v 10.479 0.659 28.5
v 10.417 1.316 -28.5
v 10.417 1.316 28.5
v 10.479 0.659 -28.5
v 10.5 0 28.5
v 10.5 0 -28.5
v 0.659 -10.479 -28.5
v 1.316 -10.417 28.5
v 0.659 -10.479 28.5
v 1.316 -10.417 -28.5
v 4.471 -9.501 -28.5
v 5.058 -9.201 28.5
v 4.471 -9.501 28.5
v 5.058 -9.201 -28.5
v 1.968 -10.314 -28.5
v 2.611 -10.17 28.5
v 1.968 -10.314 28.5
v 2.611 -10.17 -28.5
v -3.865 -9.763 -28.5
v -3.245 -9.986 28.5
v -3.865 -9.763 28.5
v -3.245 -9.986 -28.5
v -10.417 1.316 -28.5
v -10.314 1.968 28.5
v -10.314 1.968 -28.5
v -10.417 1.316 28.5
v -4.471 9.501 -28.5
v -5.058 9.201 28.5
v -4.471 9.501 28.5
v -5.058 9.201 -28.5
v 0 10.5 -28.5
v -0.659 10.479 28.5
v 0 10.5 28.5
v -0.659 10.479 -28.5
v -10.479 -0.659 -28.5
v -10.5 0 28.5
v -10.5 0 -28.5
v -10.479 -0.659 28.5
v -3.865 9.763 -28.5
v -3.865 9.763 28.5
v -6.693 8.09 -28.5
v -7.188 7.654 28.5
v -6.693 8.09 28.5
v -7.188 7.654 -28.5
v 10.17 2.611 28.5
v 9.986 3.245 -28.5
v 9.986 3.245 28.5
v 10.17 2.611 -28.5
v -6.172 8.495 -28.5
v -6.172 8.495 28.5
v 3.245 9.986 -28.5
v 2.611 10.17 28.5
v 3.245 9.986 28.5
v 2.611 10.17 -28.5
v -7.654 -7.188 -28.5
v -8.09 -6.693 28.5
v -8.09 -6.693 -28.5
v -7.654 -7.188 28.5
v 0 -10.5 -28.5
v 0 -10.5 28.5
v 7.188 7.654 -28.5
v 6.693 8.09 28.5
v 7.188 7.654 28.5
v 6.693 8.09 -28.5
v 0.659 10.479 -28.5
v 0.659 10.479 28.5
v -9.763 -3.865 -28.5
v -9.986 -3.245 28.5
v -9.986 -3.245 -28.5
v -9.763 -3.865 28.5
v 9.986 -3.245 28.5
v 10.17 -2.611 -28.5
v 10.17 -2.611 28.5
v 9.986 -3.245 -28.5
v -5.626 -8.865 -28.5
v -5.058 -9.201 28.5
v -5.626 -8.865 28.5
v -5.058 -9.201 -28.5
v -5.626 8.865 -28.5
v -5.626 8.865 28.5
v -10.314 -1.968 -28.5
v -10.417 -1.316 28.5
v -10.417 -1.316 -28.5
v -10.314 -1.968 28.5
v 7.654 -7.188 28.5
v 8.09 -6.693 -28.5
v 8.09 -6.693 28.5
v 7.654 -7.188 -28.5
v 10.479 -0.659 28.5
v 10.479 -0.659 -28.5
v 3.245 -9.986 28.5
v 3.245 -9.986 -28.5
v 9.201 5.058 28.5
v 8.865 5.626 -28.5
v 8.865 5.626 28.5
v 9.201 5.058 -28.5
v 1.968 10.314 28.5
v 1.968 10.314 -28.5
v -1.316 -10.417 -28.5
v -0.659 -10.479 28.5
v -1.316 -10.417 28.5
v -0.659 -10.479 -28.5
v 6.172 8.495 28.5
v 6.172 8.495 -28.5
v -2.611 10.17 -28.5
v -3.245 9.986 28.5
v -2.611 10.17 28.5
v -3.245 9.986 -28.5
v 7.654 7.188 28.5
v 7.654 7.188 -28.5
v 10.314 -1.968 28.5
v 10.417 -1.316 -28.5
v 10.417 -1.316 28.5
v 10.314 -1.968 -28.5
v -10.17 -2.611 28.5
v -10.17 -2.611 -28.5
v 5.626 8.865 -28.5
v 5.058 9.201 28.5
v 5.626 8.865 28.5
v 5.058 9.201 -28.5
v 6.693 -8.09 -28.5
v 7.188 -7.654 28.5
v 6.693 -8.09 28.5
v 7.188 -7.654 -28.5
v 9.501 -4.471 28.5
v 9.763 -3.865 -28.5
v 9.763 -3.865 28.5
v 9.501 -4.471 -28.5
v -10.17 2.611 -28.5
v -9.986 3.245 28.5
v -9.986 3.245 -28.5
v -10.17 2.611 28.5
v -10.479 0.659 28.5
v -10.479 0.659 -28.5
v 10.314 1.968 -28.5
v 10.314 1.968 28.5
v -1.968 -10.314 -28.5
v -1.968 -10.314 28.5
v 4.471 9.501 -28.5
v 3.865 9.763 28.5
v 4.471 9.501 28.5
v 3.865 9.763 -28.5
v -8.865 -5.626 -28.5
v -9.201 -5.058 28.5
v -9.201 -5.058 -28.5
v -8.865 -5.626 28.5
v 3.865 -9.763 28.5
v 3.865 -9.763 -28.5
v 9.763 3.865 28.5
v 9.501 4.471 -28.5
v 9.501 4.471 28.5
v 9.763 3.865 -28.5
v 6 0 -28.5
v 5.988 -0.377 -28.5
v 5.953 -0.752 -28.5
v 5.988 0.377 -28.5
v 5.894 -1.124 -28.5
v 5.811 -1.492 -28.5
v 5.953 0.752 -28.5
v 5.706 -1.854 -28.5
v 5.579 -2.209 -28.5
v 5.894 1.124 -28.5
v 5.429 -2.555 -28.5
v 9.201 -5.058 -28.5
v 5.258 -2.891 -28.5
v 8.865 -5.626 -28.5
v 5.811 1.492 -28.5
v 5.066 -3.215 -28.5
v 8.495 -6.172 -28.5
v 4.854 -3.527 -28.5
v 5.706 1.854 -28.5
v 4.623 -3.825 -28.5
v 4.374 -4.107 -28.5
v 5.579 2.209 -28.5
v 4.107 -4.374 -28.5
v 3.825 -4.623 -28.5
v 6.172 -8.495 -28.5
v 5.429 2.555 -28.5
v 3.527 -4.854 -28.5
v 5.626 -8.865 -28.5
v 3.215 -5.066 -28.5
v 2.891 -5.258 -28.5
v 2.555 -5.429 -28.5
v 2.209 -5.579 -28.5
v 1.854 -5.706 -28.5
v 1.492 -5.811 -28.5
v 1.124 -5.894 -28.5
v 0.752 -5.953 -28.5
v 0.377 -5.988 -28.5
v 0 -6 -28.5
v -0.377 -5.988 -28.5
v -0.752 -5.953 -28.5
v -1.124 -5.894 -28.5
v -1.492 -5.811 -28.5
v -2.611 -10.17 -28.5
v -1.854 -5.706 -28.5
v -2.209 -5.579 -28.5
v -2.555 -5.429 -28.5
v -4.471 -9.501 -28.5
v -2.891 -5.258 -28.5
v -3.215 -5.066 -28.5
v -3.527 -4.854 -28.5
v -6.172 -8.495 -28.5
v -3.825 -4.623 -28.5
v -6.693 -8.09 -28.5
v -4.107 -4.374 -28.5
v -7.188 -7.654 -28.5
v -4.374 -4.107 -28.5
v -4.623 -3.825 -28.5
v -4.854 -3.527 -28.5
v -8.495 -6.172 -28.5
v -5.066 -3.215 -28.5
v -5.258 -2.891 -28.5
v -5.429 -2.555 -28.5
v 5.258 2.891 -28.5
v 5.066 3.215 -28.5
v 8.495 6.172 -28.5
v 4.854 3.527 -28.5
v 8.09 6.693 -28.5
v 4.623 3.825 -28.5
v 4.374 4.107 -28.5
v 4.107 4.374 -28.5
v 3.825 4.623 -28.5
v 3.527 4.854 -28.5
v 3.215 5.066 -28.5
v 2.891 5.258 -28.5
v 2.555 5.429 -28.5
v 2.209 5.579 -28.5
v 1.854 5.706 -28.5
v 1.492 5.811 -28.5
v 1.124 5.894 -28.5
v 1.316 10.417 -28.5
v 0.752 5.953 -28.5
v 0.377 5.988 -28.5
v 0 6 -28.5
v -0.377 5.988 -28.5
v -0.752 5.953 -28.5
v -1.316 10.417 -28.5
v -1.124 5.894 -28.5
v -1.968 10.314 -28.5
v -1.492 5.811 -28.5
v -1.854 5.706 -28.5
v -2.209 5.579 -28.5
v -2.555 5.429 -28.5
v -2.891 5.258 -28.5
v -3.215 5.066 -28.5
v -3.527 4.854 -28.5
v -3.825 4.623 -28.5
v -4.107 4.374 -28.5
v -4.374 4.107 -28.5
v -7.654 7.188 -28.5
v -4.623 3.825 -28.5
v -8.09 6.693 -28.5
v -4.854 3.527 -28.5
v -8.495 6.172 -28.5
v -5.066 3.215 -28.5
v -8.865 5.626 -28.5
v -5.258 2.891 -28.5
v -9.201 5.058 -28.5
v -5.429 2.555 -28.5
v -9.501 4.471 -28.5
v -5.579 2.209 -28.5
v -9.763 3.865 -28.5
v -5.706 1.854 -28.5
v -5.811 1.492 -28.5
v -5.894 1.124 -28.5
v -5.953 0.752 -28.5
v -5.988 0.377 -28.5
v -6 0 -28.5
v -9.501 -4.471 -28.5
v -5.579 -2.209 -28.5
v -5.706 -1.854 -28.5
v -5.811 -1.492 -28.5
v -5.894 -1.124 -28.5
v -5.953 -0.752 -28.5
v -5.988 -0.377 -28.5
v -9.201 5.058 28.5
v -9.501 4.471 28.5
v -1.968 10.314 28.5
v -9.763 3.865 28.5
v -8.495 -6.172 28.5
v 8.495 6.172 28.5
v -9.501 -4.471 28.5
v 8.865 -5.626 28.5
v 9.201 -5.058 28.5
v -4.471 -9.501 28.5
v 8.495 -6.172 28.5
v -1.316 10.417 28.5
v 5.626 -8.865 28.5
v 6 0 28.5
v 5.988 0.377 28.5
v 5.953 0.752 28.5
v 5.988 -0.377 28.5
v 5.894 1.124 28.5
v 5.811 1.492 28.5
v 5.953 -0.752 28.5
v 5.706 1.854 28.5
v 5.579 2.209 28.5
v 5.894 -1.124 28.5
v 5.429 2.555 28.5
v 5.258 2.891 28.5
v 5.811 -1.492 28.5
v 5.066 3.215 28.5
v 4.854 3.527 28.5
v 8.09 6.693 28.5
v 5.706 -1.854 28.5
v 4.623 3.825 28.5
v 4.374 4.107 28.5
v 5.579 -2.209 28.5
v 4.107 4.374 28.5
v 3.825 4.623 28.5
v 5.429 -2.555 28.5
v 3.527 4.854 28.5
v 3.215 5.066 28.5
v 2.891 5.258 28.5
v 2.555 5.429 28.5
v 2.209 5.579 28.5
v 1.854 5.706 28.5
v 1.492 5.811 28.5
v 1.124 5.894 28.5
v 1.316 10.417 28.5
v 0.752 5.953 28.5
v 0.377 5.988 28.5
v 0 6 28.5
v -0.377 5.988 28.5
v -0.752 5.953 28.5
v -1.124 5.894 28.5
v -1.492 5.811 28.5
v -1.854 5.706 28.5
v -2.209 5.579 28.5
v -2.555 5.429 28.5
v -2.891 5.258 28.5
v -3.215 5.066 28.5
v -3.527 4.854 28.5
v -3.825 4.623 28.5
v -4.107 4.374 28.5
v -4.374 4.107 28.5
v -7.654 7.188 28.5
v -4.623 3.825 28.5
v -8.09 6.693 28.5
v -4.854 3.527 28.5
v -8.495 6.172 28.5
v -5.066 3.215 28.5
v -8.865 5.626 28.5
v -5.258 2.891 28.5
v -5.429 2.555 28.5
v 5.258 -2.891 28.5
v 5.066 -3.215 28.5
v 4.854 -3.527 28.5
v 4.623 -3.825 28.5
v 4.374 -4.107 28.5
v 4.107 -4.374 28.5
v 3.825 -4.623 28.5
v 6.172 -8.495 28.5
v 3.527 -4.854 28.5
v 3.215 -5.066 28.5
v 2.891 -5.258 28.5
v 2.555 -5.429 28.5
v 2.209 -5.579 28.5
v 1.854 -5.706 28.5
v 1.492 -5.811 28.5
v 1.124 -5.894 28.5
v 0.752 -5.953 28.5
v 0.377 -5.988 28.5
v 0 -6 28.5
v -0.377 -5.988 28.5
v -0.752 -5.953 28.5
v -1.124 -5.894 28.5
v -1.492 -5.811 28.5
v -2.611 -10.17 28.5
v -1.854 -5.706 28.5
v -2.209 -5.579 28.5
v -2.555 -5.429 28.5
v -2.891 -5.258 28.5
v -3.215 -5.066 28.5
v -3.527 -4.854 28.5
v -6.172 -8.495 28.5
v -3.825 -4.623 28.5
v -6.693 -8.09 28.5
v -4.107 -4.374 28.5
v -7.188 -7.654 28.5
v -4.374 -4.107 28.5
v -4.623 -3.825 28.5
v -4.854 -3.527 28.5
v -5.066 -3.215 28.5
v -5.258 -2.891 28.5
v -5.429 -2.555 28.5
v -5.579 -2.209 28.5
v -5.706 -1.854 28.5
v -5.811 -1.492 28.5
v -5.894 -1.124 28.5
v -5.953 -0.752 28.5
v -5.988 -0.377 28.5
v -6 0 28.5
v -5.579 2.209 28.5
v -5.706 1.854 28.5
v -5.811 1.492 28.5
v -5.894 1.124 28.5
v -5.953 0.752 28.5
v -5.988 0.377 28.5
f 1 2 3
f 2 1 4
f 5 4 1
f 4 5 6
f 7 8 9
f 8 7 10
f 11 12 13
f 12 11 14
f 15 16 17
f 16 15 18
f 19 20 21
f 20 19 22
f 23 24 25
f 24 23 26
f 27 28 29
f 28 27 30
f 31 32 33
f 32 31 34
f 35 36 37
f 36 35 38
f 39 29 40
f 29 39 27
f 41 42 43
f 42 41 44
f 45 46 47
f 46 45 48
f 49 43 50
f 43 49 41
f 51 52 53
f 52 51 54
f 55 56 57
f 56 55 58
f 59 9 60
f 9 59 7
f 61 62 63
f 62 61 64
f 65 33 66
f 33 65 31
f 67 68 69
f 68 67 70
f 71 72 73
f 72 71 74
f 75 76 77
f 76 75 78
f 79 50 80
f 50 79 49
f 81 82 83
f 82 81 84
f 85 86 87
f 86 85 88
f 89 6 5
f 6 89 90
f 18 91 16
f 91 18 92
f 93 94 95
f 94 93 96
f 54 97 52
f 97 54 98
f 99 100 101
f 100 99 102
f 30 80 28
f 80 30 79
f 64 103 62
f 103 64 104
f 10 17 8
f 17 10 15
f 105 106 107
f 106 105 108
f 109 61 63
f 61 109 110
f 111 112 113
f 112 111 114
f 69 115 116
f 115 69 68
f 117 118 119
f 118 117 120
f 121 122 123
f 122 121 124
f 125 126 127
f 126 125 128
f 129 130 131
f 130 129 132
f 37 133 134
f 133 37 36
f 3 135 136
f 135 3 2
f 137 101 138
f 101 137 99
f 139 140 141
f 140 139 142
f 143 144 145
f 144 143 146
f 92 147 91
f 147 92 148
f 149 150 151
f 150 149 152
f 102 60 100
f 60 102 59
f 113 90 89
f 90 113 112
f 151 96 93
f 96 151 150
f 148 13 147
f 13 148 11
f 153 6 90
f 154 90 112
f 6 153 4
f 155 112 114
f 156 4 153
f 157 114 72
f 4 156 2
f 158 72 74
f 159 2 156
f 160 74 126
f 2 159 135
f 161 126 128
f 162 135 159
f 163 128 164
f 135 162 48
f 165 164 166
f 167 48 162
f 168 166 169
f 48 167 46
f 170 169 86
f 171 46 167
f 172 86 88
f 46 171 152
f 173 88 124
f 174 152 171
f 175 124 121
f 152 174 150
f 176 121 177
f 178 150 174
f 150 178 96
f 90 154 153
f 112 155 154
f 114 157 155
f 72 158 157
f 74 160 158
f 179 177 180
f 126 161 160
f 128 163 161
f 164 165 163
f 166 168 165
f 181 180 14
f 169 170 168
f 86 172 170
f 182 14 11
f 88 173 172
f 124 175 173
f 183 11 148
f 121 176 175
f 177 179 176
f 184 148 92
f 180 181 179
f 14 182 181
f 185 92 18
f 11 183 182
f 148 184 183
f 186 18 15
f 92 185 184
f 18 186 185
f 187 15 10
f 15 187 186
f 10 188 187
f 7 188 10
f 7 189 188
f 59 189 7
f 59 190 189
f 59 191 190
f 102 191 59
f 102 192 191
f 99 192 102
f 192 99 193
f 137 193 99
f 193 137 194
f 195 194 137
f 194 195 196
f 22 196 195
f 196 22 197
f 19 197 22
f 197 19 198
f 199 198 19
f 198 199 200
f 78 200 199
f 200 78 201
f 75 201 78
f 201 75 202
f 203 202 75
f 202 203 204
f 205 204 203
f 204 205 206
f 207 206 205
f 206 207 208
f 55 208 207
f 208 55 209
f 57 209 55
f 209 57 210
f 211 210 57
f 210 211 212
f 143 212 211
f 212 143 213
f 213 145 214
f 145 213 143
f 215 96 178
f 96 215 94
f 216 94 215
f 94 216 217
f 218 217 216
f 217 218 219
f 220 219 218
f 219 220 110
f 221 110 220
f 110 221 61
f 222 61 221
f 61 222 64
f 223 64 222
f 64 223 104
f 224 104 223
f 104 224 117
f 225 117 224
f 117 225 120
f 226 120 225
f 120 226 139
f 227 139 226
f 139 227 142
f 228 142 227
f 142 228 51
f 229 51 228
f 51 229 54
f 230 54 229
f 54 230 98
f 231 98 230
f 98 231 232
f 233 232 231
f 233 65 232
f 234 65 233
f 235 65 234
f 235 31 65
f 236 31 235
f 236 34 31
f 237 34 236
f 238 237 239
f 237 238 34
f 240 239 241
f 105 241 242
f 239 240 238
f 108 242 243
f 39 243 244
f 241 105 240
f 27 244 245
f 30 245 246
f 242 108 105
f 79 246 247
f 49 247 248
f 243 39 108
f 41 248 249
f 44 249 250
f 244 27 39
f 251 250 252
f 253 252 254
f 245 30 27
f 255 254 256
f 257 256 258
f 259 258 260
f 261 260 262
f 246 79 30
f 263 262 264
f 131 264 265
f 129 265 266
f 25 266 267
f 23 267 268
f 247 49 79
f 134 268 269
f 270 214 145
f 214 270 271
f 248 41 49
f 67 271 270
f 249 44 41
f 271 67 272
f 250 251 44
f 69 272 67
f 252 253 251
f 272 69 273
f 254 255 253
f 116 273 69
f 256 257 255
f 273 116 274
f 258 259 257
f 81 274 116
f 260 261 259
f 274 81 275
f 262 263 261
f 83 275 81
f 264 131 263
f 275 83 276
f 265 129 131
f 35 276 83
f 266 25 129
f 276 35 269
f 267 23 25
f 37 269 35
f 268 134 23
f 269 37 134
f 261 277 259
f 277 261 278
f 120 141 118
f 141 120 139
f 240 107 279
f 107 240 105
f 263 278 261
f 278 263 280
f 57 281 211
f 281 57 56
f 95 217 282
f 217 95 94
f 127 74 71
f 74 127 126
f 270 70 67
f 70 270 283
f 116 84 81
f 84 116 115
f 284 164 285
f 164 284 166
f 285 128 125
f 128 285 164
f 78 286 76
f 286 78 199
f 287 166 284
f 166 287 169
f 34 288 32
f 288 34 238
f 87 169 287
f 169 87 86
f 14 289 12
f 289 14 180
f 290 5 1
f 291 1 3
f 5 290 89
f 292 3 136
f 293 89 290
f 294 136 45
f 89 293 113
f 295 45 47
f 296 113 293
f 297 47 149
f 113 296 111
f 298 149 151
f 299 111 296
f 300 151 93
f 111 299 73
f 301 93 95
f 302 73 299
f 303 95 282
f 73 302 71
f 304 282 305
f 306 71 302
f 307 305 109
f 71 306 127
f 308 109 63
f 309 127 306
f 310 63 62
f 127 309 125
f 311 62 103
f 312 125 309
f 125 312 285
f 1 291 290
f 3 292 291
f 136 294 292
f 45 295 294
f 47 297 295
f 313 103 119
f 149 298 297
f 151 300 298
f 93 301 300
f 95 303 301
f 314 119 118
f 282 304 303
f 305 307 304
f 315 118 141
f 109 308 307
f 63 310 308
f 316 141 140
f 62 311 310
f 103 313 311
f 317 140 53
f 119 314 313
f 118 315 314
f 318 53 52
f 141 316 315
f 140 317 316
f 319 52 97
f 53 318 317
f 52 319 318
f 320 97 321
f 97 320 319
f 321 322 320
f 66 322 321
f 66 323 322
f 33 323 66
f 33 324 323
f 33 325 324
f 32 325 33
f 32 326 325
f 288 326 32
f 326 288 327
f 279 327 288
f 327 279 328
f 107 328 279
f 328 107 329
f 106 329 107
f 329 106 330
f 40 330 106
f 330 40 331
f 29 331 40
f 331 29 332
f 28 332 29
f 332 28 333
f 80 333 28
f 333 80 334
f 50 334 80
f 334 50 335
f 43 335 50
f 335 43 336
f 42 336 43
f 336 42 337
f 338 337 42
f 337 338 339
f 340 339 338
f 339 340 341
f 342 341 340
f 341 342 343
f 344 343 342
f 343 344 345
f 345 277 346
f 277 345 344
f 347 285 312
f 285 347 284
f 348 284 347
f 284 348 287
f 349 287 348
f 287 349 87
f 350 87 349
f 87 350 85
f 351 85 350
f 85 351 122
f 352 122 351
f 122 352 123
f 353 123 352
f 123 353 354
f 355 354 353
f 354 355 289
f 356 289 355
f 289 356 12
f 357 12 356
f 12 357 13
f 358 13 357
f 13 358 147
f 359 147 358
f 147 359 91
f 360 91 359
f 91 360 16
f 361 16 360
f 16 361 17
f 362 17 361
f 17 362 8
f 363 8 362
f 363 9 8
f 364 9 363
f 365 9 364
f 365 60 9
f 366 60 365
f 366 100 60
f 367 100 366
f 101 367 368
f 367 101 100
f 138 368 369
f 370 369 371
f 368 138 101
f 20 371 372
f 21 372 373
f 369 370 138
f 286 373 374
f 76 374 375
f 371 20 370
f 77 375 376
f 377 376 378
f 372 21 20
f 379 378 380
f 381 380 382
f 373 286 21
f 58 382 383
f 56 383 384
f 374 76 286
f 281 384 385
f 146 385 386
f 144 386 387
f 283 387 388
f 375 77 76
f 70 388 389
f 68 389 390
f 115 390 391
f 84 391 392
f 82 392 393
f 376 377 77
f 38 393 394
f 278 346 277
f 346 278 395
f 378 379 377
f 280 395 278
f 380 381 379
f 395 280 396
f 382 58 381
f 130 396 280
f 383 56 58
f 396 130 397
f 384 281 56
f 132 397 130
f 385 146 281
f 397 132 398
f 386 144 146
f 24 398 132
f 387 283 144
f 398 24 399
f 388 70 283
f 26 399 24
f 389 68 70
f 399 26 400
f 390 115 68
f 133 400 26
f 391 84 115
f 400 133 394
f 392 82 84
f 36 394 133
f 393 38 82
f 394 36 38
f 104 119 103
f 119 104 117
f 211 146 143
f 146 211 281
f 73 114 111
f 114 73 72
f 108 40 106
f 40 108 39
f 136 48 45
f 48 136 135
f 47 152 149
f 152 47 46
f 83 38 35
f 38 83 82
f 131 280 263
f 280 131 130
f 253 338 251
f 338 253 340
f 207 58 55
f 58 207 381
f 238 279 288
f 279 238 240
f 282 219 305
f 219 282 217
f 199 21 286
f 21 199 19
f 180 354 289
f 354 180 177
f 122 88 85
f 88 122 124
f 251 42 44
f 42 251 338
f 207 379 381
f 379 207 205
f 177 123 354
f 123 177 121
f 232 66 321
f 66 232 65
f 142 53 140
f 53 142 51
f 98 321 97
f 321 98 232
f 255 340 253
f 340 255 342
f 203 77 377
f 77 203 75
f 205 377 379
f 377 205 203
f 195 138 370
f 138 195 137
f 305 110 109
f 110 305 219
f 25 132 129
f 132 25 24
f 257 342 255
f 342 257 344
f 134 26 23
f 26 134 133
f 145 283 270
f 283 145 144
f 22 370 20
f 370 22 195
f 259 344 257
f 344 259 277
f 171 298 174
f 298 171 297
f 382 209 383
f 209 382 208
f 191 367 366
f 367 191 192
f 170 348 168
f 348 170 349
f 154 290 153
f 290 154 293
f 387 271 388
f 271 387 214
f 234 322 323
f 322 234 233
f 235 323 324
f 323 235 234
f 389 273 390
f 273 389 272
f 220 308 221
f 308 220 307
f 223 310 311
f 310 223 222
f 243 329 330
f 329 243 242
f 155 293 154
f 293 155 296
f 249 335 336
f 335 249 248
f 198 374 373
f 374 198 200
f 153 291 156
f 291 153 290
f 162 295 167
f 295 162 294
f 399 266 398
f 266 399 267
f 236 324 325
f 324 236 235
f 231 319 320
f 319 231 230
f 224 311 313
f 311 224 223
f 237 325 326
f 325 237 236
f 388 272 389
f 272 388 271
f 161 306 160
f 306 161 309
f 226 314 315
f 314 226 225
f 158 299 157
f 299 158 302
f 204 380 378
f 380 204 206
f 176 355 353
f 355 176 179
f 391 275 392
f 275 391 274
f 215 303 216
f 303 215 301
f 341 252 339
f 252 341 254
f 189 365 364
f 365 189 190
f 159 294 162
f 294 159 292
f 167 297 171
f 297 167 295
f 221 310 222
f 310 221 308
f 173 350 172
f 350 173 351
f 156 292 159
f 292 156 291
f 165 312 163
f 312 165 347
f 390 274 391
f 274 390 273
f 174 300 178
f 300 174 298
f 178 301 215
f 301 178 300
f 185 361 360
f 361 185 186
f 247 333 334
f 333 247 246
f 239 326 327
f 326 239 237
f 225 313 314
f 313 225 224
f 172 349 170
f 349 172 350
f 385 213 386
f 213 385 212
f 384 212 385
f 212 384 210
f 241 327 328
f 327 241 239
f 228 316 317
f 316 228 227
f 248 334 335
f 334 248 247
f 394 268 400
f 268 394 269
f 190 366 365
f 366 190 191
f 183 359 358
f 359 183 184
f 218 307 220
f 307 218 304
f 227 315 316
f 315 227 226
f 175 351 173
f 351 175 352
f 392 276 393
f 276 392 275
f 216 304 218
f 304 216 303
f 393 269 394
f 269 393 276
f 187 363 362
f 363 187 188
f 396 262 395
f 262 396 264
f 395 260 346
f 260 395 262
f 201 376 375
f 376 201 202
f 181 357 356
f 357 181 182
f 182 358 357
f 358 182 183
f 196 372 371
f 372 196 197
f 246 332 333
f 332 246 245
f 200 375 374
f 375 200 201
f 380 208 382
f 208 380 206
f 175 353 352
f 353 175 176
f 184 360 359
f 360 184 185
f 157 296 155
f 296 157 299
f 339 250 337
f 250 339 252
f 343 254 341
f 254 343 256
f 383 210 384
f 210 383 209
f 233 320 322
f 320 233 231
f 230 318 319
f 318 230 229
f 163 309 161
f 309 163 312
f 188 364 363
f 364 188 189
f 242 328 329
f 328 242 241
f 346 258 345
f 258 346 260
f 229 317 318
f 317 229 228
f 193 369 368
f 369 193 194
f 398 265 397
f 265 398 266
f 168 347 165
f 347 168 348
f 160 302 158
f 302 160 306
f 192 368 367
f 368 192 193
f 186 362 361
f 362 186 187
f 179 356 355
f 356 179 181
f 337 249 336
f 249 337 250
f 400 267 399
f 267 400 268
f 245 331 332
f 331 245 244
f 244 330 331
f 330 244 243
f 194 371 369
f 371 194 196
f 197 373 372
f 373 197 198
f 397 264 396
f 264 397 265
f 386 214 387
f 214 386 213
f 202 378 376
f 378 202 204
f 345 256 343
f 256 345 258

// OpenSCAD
$fn=100;

module linear_bearing() {
    color("darkgray",1.0) difference() {
        cylinder(r=10.5,h=57,center=true);
        cylinder(r=6,h=59,center=true);
    }
}

linear_bearing();
